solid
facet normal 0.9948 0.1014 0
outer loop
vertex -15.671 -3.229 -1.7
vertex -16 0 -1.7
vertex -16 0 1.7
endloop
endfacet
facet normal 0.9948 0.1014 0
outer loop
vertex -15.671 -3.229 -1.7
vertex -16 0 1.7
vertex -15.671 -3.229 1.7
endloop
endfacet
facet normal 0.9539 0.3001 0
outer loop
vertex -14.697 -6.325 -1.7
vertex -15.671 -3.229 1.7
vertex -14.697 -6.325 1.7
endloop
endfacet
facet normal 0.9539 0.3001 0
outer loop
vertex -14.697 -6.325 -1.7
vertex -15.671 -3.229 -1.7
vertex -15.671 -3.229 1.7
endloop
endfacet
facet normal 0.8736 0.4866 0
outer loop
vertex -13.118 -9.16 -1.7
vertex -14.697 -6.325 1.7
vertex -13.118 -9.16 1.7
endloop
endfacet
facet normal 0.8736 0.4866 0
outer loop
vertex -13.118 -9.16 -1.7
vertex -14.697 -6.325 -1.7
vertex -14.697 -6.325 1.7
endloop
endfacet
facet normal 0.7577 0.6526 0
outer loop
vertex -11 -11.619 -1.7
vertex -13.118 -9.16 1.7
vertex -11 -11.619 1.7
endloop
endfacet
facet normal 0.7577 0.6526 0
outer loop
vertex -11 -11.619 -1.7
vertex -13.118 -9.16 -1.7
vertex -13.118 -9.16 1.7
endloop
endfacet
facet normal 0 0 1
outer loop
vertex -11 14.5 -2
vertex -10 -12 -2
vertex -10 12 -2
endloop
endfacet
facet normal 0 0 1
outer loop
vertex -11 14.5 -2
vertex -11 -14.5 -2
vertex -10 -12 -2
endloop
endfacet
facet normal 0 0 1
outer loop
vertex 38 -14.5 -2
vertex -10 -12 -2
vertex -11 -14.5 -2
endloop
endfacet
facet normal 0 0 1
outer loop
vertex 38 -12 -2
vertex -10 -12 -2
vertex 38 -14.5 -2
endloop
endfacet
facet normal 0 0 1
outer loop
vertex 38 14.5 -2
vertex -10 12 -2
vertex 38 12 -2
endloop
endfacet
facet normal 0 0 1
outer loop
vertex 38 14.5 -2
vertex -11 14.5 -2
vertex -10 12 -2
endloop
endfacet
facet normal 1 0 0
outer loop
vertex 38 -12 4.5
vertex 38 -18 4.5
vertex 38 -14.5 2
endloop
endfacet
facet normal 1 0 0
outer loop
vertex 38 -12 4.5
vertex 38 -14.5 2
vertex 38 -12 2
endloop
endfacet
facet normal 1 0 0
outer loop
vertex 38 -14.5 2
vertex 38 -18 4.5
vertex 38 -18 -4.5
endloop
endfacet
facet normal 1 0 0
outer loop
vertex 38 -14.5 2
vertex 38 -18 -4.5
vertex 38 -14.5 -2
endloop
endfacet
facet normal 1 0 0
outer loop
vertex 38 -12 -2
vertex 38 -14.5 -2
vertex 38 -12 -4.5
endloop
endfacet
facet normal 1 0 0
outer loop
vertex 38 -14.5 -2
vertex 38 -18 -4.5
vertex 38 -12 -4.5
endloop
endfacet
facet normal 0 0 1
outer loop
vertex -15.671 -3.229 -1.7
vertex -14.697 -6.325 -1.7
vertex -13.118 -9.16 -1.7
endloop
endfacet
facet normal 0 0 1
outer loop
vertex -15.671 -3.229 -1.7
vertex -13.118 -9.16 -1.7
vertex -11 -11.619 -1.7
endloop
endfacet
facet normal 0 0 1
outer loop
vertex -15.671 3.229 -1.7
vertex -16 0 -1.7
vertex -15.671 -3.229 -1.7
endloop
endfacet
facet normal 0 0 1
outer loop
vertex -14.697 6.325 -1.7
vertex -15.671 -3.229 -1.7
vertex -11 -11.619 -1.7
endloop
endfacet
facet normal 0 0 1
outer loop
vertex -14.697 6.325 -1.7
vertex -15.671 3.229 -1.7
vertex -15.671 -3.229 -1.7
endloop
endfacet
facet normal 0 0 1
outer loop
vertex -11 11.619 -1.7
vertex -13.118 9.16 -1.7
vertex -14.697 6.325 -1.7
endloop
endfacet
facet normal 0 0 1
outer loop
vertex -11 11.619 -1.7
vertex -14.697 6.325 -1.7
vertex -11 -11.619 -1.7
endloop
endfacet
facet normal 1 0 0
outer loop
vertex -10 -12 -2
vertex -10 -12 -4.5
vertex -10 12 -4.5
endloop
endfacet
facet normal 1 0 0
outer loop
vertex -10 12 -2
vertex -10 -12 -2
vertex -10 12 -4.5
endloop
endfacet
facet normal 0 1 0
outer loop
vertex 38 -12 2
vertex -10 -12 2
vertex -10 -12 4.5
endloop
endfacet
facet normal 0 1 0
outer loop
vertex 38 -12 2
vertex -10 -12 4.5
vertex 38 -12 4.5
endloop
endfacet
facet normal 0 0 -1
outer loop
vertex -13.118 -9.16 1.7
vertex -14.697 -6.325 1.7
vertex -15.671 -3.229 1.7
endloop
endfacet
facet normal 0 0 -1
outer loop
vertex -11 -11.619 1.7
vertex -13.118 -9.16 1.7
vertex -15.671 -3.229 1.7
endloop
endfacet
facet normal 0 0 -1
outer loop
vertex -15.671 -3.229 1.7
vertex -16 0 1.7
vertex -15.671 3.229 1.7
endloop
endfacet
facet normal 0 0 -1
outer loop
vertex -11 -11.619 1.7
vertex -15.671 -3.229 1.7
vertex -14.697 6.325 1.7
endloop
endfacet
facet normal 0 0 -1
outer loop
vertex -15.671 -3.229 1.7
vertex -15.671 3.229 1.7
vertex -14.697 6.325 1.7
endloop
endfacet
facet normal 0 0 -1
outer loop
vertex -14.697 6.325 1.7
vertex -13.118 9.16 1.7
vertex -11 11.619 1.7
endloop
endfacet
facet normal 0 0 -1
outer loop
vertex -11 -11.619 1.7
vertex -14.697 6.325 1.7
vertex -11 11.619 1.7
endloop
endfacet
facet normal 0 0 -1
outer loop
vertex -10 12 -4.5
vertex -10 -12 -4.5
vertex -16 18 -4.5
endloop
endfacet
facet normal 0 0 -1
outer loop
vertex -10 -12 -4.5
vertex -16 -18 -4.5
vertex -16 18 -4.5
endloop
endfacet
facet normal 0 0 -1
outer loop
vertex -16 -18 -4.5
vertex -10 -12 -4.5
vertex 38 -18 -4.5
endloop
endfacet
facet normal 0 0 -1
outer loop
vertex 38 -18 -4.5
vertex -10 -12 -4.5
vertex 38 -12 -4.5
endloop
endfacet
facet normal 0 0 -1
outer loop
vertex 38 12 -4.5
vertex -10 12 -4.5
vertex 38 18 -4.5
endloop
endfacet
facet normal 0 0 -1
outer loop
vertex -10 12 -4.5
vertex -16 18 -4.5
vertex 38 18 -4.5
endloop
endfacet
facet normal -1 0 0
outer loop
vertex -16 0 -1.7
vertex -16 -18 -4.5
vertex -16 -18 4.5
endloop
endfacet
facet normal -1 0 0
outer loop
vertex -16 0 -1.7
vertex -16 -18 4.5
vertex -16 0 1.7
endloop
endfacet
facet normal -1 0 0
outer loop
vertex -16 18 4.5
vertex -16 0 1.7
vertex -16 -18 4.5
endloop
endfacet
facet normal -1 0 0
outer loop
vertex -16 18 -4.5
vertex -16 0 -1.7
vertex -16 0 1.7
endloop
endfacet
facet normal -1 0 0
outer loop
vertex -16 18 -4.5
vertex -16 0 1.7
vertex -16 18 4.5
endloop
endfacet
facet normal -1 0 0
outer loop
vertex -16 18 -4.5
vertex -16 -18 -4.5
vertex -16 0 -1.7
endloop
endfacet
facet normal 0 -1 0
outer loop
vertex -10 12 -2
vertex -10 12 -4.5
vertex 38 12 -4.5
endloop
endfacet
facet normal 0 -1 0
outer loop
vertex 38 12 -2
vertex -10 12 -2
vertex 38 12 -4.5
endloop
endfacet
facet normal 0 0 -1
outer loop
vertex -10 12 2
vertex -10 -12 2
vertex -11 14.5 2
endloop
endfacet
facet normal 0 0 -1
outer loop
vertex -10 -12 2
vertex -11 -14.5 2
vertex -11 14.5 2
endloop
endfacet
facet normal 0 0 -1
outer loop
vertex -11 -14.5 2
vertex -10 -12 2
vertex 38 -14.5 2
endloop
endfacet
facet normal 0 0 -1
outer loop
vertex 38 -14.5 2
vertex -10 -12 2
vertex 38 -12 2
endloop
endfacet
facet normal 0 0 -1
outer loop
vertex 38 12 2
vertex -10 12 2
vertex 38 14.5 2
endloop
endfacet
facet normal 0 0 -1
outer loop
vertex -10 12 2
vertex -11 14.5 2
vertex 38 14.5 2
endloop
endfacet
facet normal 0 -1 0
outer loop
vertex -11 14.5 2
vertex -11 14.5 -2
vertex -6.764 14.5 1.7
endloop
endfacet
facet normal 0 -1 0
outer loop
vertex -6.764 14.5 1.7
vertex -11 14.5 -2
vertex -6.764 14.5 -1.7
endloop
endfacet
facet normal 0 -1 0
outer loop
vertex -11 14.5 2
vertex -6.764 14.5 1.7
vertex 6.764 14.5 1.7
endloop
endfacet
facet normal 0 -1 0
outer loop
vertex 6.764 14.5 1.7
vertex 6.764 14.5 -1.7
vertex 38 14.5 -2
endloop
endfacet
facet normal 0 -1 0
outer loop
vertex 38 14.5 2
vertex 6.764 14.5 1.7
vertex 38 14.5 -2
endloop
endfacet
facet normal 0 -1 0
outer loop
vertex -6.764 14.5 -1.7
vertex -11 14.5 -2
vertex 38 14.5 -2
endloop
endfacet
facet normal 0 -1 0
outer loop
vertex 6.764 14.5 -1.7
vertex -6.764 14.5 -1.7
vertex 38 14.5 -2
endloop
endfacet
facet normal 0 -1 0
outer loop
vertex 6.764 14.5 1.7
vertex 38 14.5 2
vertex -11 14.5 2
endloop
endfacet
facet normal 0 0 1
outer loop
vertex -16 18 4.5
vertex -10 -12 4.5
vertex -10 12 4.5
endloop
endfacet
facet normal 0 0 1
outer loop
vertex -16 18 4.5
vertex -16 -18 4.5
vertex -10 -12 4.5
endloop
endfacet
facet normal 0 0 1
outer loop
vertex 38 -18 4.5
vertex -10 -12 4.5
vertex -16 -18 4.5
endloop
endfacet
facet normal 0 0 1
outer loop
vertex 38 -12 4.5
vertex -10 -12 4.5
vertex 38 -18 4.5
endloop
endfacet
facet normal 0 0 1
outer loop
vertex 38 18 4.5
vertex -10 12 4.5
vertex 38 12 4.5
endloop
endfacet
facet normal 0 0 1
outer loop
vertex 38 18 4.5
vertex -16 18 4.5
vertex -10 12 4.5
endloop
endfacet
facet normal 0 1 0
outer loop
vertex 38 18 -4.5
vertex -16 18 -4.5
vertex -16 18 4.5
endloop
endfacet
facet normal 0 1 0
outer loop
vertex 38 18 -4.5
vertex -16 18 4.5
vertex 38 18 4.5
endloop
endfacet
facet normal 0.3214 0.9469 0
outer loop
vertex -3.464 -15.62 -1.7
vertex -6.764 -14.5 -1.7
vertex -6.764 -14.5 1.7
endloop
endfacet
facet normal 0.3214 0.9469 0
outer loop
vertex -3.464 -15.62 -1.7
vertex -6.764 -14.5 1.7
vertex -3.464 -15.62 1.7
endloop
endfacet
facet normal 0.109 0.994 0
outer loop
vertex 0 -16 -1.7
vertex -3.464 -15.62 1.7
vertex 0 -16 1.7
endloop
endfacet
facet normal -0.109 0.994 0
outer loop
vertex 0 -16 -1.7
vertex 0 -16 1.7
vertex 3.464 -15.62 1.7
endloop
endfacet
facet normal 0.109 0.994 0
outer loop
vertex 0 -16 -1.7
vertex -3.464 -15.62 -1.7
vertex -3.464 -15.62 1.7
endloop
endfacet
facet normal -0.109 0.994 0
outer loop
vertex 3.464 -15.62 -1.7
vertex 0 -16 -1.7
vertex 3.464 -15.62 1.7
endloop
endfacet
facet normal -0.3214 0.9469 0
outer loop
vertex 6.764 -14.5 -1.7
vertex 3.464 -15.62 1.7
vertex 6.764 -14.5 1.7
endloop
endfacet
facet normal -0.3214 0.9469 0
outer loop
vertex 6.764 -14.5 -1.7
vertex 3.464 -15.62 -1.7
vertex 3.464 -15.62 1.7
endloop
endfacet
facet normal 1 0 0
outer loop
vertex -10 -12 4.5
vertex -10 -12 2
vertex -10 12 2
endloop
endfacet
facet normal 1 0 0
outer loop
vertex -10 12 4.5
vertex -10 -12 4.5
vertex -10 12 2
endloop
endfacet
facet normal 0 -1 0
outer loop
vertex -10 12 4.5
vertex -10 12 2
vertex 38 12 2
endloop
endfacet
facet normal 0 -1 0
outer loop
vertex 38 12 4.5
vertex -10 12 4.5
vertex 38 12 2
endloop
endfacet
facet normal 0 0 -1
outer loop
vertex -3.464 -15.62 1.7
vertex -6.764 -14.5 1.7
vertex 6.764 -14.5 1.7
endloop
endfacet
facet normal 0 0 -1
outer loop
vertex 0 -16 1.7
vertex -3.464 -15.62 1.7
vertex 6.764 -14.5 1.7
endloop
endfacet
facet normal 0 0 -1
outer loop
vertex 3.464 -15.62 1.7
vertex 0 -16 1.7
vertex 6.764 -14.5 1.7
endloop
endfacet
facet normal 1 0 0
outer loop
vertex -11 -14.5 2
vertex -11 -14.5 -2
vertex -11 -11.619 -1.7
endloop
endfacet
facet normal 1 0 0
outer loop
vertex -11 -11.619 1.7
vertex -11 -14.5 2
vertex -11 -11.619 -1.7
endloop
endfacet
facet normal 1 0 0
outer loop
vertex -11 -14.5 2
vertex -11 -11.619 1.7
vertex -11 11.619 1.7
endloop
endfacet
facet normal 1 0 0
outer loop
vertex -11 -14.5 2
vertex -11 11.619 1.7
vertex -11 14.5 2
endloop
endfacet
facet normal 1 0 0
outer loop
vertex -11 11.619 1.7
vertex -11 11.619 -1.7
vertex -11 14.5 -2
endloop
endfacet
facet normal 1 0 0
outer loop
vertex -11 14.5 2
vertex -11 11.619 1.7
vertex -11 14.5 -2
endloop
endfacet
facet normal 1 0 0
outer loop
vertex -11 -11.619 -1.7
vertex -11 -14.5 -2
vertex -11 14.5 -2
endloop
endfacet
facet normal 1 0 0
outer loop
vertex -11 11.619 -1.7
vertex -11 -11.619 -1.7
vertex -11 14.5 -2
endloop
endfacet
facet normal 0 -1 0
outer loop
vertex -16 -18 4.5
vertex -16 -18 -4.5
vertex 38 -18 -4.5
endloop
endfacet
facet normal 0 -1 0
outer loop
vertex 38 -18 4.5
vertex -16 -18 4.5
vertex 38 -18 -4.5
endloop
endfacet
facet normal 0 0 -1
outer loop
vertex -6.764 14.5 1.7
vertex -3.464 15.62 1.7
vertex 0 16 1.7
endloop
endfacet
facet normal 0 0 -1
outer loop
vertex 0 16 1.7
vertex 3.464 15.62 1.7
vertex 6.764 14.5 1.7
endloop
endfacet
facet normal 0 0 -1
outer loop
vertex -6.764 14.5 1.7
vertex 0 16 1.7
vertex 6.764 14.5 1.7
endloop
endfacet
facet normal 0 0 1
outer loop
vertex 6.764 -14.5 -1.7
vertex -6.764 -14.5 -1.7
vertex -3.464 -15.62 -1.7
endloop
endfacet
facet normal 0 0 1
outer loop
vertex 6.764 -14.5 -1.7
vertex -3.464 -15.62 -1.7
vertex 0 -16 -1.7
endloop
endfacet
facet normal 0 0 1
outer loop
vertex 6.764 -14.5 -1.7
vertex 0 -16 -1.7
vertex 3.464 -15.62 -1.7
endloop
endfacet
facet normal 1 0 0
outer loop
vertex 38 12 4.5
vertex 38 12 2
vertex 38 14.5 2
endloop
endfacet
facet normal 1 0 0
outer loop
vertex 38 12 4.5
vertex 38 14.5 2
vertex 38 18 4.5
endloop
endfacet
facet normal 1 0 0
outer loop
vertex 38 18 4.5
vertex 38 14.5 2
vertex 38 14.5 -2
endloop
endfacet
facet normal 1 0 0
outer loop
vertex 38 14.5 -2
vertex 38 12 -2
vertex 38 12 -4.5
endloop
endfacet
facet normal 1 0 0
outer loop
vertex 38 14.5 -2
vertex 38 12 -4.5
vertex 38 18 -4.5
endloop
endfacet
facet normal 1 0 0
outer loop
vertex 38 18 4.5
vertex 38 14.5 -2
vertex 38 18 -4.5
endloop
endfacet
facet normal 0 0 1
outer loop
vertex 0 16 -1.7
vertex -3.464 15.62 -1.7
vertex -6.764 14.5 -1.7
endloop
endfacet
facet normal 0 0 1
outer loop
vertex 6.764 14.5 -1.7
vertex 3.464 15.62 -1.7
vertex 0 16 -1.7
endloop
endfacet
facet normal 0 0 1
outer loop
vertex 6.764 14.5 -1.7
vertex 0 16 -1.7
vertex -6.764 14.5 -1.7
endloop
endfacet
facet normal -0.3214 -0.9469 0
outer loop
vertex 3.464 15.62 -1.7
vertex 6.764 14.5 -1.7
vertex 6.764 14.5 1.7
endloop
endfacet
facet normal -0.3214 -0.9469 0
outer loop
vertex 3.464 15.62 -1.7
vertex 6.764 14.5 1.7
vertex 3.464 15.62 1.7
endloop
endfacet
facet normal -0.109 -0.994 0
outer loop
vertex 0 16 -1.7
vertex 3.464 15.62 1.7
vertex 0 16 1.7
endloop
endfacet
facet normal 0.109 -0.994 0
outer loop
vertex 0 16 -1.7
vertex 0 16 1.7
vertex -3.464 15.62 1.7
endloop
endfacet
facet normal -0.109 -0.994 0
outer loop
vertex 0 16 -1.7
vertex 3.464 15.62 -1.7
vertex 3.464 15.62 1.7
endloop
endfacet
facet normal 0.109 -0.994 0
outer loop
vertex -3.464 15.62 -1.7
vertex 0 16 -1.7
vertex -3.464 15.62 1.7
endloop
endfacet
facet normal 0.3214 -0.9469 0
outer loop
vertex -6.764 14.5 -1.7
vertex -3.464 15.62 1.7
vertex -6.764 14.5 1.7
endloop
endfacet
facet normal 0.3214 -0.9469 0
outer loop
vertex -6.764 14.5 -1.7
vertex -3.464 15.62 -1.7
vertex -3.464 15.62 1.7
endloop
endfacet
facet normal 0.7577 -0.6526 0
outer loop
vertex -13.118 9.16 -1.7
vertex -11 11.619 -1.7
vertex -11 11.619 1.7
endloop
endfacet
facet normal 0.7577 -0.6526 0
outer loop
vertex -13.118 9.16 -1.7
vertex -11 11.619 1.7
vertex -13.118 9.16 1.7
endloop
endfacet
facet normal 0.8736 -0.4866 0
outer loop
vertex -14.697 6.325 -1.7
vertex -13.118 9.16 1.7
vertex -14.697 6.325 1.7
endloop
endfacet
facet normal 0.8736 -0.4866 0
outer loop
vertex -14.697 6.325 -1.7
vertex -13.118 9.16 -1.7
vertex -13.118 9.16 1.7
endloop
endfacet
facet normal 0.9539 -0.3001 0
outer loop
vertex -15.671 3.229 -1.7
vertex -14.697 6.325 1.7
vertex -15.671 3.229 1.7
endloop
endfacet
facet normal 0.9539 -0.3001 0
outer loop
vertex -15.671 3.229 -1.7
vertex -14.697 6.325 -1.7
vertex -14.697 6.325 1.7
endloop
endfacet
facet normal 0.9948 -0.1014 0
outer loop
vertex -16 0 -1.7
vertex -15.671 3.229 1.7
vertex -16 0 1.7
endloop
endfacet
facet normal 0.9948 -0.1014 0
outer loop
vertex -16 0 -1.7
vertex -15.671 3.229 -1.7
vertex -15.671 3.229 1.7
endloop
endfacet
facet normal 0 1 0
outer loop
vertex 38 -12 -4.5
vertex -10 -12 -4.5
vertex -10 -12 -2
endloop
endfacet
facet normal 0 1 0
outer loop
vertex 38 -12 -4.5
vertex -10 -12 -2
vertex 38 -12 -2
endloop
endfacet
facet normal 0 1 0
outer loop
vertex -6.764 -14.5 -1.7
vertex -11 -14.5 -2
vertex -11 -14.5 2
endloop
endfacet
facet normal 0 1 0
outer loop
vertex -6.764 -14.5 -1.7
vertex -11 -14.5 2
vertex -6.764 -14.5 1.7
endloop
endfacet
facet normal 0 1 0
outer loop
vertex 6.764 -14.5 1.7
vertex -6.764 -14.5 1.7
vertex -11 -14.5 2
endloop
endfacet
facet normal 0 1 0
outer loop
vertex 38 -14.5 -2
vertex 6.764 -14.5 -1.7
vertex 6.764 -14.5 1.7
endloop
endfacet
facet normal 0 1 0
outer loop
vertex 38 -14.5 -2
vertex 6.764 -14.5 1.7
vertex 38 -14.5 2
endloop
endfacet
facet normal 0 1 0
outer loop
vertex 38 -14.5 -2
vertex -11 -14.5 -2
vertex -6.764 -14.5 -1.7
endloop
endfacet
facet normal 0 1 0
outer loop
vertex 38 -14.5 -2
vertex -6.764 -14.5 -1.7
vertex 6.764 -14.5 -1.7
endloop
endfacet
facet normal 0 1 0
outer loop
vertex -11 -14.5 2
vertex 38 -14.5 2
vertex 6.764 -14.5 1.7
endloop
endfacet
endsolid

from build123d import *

# Parameters (mm, degrees)
CYLINDER_R     = 16
CYLINDER_DEPTH = 3.4
BOX002_W       = 50
BOX002_H       = 29
BOX002_DEPTH   = 4
BOX001_W       = 58
BOX001_H       = 24
BOX001_DEPTH   = 30
BOX_W          = 54
BOX_H          = 36
BOX_DEPTH      = 9


with BuildPart() as lens_hole:
    # Cylinder → Cylinder (new body)
    with BuildSketch(Plane.XY.offset(-1.7)):
        Circle(CYLINDER_R)
    extrude(amount=CYLINDER_DEPTH)


with BuildPart() as inner_lens_extraction_cube:
    # Box002 → Box002 (new body)
    with BuildSketch(Plane(origin=(-11, -14.5, -2), x_dir=(1, 0, 0), z_dir=(0, 0, 1))):
        with Locations((25, 14.5)):
            Rectangle(BOX002_W, BOX002_H)
    extrude(amount=BOX002_DEPTH)


with BuildPart() as holder_cut_fusion:
    # Box001 → Box001 (new body)
    with BuildSketch(Plane(origin=(-10, -12, -15), x_dir=(1, 0, 0), z_dir=(0, 0, 1))):
        with Locations((29, 12)):
            Rectangle(BOX001_W, BOX001_H)
    extrude(amount=BOX001_DEPTH)

    # Fusion: union lens hole, inner lens extraction cube
    add(lens_hole.part)
    add(inner_lens_extraction_cube.part)


with BuildPart() as holder_cut:
    # Box → Box (new body)
    with BuildSketch(Plane(origin=(-16, -18, -4.5), x_dir=(1, 0, 0), z_dir=(0, 0, 1))):
        with Locations((27, 18)):
            Rectangle(BOX_W, BOX_H)
    extrude(amount=BOX_DEPTH)

    # Cut: cut holder cut fusion
    add(holder_cut_fusion.part, mode=Mode.SUBTRACT)


solid = holder_cut.part
